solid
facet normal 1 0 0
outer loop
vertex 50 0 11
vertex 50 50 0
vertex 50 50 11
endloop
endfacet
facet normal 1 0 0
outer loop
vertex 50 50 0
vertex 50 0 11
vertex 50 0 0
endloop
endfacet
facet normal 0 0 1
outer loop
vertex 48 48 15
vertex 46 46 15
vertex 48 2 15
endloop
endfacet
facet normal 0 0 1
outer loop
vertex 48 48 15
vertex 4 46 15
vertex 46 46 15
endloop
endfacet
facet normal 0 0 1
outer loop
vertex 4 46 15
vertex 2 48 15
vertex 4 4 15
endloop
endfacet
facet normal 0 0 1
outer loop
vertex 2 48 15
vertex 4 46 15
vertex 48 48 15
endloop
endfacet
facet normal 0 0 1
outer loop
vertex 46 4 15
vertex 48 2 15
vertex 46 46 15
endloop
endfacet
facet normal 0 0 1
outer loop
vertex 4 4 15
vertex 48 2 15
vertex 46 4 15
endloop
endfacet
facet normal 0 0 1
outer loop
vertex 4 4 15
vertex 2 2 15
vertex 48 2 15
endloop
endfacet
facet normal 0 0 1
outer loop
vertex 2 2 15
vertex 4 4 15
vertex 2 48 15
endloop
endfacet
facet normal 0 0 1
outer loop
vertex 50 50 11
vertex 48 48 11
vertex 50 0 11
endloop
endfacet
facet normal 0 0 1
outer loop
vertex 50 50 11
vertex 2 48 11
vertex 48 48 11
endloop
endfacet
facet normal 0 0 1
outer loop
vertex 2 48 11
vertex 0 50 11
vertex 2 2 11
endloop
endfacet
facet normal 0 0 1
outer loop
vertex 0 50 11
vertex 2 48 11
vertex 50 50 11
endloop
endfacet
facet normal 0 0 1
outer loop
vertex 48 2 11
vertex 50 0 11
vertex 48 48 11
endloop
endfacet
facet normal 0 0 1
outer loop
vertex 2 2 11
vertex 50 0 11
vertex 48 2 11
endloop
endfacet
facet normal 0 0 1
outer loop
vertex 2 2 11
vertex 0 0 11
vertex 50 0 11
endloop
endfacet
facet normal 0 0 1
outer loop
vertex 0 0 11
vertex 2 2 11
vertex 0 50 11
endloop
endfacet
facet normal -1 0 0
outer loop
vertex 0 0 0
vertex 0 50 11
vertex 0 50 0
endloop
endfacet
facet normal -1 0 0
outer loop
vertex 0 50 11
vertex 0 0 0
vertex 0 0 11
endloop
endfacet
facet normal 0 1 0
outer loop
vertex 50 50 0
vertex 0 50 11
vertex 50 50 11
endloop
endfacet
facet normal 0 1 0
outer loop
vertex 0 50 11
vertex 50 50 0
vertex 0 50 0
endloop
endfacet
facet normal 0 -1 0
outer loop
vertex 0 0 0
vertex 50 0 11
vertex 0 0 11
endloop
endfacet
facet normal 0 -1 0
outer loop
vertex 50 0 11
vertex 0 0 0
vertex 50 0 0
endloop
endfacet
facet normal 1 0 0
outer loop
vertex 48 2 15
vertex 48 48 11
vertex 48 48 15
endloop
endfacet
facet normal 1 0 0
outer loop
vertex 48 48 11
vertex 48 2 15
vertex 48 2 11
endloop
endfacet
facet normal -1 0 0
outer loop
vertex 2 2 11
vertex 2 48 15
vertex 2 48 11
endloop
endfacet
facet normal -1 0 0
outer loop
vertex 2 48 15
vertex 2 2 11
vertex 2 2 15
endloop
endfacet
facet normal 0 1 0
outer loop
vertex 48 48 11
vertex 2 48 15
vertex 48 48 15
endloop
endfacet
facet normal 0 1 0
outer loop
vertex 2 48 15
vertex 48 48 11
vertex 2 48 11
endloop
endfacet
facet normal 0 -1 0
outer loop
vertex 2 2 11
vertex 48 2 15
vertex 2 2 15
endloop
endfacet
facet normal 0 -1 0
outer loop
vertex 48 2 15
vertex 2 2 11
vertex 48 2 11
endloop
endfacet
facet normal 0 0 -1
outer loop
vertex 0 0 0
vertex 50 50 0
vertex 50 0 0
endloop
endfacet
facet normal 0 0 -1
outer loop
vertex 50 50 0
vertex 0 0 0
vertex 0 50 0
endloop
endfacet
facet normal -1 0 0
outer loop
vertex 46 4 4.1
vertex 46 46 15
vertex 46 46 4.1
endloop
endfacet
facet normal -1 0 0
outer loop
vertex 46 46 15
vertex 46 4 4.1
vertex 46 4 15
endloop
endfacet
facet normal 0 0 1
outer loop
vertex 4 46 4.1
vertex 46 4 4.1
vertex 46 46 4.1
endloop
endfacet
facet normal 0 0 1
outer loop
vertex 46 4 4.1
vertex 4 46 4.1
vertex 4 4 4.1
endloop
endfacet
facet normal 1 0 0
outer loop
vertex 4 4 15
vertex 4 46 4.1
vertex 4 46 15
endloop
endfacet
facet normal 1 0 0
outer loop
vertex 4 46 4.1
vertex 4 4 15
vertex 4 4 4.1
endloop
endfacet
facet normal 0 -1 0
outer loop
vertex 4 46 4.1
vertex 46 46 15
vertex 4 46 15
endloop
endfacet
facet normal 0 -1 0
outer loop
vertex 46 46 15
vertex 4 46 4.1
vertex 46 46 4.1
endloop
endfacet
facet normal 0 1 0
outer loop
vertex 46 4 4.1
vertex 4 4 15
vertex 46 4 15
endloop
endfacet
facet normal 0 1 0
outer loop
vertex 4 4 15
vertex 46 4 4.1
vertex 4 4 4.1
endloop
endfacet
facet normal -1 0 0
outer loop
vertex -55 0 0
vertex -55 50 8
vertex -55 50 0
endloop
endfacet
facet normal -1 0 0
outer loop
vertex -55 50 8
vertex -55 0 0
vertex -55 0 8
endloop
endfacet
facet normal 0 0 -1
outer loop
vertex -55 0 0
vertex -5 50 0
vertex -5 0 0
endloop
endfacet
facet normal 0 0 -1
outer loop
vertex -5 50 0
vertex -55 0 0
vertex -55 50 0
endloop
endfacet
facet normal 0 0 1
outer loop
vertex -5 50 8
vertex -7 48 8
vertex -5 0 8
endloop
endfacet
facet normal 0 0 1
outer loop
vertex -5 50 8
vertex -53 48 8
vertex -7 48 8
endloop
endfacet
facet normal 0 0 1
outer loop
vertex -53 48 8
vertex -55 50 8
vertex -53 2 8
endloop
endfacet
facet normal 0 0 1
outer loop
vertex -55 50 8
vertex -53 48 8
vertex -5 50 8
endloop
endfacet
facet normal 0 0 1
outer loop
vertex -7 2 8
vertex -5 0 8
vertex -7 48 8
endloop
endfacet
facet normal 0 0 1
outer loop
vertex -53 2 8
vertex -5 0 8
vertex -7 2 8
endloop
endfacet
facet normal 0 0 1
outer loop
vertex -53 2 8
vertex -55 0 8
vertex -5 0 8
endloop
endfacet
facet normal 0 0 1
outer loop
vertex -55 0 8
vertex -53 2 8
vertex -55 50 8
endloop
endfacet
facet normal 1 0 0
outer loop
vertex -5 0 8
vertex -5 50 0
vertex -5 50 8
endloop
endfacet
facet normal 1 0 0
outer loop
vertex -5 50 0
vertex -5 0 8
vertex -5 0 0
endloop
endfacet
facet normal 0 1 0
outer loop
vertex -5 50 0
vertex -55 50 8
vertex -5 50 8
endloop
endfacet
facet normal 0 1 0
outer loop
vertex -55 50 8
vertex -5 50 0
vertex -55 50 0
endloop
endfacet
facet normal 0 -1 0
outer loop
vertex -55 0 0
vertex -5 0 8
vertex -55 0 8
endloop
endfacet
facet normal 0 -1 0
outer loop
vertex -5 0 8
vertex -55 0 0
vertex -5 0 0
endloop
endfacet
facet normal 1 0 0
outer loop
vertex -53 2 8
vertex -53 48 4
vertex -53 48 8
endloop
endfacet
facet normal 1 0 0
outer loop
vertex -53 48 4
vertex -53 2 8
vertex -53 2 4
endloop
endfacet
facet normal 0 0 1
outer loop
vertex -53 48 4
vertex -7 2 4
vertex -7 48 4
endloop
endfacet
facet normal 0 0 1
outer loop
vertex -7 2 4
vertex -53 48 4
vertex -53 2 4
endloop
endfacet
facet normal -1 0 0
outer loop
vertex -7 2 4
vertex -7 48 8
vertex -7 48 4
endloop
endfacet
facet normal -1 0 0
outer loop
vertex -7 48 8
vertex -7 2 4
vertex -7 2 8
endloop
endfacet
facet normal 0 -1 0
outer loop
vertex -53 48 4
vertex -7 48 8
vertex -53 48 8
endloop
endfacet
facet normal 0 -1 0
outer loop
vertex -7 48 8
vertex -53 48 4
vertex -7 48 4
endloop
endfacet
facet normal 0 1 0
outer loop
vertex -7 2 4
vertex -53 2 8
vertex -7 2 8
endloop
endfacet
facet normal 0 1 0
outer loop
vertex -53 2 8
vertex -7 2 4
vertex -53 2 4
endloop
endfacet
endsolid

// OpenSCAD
_length = 50; // x
_width = 50; // y
_height = 15; // z
_wall = 4;

// The box
difference(){
cube([_length, _width, _height]);
translate([_wall, _wall, _wall + .1])
cube([_length - _wall * 2, _width - _wall * 2,  _height - _wall]);
	translate([0, 0, _height - _wall])
	difference() {
		cube([_length, _width, _wall]);
		translate([_wall / 2, _wall / 2, 0])
		cube([_length - _wall, _width - _wall, _wall + 2]);
	}
}



// The Lid
rotate([0,180,0])
translate([5, 0, _wall * -2]) 
difference() {
cube([_length, _width, _wall * 2]);
// Cut out in middle of box
translate([_wall / 2, _wall / 2, -1])
cube([_length - _wall, _width - _wall, _wall + 1]);
}
